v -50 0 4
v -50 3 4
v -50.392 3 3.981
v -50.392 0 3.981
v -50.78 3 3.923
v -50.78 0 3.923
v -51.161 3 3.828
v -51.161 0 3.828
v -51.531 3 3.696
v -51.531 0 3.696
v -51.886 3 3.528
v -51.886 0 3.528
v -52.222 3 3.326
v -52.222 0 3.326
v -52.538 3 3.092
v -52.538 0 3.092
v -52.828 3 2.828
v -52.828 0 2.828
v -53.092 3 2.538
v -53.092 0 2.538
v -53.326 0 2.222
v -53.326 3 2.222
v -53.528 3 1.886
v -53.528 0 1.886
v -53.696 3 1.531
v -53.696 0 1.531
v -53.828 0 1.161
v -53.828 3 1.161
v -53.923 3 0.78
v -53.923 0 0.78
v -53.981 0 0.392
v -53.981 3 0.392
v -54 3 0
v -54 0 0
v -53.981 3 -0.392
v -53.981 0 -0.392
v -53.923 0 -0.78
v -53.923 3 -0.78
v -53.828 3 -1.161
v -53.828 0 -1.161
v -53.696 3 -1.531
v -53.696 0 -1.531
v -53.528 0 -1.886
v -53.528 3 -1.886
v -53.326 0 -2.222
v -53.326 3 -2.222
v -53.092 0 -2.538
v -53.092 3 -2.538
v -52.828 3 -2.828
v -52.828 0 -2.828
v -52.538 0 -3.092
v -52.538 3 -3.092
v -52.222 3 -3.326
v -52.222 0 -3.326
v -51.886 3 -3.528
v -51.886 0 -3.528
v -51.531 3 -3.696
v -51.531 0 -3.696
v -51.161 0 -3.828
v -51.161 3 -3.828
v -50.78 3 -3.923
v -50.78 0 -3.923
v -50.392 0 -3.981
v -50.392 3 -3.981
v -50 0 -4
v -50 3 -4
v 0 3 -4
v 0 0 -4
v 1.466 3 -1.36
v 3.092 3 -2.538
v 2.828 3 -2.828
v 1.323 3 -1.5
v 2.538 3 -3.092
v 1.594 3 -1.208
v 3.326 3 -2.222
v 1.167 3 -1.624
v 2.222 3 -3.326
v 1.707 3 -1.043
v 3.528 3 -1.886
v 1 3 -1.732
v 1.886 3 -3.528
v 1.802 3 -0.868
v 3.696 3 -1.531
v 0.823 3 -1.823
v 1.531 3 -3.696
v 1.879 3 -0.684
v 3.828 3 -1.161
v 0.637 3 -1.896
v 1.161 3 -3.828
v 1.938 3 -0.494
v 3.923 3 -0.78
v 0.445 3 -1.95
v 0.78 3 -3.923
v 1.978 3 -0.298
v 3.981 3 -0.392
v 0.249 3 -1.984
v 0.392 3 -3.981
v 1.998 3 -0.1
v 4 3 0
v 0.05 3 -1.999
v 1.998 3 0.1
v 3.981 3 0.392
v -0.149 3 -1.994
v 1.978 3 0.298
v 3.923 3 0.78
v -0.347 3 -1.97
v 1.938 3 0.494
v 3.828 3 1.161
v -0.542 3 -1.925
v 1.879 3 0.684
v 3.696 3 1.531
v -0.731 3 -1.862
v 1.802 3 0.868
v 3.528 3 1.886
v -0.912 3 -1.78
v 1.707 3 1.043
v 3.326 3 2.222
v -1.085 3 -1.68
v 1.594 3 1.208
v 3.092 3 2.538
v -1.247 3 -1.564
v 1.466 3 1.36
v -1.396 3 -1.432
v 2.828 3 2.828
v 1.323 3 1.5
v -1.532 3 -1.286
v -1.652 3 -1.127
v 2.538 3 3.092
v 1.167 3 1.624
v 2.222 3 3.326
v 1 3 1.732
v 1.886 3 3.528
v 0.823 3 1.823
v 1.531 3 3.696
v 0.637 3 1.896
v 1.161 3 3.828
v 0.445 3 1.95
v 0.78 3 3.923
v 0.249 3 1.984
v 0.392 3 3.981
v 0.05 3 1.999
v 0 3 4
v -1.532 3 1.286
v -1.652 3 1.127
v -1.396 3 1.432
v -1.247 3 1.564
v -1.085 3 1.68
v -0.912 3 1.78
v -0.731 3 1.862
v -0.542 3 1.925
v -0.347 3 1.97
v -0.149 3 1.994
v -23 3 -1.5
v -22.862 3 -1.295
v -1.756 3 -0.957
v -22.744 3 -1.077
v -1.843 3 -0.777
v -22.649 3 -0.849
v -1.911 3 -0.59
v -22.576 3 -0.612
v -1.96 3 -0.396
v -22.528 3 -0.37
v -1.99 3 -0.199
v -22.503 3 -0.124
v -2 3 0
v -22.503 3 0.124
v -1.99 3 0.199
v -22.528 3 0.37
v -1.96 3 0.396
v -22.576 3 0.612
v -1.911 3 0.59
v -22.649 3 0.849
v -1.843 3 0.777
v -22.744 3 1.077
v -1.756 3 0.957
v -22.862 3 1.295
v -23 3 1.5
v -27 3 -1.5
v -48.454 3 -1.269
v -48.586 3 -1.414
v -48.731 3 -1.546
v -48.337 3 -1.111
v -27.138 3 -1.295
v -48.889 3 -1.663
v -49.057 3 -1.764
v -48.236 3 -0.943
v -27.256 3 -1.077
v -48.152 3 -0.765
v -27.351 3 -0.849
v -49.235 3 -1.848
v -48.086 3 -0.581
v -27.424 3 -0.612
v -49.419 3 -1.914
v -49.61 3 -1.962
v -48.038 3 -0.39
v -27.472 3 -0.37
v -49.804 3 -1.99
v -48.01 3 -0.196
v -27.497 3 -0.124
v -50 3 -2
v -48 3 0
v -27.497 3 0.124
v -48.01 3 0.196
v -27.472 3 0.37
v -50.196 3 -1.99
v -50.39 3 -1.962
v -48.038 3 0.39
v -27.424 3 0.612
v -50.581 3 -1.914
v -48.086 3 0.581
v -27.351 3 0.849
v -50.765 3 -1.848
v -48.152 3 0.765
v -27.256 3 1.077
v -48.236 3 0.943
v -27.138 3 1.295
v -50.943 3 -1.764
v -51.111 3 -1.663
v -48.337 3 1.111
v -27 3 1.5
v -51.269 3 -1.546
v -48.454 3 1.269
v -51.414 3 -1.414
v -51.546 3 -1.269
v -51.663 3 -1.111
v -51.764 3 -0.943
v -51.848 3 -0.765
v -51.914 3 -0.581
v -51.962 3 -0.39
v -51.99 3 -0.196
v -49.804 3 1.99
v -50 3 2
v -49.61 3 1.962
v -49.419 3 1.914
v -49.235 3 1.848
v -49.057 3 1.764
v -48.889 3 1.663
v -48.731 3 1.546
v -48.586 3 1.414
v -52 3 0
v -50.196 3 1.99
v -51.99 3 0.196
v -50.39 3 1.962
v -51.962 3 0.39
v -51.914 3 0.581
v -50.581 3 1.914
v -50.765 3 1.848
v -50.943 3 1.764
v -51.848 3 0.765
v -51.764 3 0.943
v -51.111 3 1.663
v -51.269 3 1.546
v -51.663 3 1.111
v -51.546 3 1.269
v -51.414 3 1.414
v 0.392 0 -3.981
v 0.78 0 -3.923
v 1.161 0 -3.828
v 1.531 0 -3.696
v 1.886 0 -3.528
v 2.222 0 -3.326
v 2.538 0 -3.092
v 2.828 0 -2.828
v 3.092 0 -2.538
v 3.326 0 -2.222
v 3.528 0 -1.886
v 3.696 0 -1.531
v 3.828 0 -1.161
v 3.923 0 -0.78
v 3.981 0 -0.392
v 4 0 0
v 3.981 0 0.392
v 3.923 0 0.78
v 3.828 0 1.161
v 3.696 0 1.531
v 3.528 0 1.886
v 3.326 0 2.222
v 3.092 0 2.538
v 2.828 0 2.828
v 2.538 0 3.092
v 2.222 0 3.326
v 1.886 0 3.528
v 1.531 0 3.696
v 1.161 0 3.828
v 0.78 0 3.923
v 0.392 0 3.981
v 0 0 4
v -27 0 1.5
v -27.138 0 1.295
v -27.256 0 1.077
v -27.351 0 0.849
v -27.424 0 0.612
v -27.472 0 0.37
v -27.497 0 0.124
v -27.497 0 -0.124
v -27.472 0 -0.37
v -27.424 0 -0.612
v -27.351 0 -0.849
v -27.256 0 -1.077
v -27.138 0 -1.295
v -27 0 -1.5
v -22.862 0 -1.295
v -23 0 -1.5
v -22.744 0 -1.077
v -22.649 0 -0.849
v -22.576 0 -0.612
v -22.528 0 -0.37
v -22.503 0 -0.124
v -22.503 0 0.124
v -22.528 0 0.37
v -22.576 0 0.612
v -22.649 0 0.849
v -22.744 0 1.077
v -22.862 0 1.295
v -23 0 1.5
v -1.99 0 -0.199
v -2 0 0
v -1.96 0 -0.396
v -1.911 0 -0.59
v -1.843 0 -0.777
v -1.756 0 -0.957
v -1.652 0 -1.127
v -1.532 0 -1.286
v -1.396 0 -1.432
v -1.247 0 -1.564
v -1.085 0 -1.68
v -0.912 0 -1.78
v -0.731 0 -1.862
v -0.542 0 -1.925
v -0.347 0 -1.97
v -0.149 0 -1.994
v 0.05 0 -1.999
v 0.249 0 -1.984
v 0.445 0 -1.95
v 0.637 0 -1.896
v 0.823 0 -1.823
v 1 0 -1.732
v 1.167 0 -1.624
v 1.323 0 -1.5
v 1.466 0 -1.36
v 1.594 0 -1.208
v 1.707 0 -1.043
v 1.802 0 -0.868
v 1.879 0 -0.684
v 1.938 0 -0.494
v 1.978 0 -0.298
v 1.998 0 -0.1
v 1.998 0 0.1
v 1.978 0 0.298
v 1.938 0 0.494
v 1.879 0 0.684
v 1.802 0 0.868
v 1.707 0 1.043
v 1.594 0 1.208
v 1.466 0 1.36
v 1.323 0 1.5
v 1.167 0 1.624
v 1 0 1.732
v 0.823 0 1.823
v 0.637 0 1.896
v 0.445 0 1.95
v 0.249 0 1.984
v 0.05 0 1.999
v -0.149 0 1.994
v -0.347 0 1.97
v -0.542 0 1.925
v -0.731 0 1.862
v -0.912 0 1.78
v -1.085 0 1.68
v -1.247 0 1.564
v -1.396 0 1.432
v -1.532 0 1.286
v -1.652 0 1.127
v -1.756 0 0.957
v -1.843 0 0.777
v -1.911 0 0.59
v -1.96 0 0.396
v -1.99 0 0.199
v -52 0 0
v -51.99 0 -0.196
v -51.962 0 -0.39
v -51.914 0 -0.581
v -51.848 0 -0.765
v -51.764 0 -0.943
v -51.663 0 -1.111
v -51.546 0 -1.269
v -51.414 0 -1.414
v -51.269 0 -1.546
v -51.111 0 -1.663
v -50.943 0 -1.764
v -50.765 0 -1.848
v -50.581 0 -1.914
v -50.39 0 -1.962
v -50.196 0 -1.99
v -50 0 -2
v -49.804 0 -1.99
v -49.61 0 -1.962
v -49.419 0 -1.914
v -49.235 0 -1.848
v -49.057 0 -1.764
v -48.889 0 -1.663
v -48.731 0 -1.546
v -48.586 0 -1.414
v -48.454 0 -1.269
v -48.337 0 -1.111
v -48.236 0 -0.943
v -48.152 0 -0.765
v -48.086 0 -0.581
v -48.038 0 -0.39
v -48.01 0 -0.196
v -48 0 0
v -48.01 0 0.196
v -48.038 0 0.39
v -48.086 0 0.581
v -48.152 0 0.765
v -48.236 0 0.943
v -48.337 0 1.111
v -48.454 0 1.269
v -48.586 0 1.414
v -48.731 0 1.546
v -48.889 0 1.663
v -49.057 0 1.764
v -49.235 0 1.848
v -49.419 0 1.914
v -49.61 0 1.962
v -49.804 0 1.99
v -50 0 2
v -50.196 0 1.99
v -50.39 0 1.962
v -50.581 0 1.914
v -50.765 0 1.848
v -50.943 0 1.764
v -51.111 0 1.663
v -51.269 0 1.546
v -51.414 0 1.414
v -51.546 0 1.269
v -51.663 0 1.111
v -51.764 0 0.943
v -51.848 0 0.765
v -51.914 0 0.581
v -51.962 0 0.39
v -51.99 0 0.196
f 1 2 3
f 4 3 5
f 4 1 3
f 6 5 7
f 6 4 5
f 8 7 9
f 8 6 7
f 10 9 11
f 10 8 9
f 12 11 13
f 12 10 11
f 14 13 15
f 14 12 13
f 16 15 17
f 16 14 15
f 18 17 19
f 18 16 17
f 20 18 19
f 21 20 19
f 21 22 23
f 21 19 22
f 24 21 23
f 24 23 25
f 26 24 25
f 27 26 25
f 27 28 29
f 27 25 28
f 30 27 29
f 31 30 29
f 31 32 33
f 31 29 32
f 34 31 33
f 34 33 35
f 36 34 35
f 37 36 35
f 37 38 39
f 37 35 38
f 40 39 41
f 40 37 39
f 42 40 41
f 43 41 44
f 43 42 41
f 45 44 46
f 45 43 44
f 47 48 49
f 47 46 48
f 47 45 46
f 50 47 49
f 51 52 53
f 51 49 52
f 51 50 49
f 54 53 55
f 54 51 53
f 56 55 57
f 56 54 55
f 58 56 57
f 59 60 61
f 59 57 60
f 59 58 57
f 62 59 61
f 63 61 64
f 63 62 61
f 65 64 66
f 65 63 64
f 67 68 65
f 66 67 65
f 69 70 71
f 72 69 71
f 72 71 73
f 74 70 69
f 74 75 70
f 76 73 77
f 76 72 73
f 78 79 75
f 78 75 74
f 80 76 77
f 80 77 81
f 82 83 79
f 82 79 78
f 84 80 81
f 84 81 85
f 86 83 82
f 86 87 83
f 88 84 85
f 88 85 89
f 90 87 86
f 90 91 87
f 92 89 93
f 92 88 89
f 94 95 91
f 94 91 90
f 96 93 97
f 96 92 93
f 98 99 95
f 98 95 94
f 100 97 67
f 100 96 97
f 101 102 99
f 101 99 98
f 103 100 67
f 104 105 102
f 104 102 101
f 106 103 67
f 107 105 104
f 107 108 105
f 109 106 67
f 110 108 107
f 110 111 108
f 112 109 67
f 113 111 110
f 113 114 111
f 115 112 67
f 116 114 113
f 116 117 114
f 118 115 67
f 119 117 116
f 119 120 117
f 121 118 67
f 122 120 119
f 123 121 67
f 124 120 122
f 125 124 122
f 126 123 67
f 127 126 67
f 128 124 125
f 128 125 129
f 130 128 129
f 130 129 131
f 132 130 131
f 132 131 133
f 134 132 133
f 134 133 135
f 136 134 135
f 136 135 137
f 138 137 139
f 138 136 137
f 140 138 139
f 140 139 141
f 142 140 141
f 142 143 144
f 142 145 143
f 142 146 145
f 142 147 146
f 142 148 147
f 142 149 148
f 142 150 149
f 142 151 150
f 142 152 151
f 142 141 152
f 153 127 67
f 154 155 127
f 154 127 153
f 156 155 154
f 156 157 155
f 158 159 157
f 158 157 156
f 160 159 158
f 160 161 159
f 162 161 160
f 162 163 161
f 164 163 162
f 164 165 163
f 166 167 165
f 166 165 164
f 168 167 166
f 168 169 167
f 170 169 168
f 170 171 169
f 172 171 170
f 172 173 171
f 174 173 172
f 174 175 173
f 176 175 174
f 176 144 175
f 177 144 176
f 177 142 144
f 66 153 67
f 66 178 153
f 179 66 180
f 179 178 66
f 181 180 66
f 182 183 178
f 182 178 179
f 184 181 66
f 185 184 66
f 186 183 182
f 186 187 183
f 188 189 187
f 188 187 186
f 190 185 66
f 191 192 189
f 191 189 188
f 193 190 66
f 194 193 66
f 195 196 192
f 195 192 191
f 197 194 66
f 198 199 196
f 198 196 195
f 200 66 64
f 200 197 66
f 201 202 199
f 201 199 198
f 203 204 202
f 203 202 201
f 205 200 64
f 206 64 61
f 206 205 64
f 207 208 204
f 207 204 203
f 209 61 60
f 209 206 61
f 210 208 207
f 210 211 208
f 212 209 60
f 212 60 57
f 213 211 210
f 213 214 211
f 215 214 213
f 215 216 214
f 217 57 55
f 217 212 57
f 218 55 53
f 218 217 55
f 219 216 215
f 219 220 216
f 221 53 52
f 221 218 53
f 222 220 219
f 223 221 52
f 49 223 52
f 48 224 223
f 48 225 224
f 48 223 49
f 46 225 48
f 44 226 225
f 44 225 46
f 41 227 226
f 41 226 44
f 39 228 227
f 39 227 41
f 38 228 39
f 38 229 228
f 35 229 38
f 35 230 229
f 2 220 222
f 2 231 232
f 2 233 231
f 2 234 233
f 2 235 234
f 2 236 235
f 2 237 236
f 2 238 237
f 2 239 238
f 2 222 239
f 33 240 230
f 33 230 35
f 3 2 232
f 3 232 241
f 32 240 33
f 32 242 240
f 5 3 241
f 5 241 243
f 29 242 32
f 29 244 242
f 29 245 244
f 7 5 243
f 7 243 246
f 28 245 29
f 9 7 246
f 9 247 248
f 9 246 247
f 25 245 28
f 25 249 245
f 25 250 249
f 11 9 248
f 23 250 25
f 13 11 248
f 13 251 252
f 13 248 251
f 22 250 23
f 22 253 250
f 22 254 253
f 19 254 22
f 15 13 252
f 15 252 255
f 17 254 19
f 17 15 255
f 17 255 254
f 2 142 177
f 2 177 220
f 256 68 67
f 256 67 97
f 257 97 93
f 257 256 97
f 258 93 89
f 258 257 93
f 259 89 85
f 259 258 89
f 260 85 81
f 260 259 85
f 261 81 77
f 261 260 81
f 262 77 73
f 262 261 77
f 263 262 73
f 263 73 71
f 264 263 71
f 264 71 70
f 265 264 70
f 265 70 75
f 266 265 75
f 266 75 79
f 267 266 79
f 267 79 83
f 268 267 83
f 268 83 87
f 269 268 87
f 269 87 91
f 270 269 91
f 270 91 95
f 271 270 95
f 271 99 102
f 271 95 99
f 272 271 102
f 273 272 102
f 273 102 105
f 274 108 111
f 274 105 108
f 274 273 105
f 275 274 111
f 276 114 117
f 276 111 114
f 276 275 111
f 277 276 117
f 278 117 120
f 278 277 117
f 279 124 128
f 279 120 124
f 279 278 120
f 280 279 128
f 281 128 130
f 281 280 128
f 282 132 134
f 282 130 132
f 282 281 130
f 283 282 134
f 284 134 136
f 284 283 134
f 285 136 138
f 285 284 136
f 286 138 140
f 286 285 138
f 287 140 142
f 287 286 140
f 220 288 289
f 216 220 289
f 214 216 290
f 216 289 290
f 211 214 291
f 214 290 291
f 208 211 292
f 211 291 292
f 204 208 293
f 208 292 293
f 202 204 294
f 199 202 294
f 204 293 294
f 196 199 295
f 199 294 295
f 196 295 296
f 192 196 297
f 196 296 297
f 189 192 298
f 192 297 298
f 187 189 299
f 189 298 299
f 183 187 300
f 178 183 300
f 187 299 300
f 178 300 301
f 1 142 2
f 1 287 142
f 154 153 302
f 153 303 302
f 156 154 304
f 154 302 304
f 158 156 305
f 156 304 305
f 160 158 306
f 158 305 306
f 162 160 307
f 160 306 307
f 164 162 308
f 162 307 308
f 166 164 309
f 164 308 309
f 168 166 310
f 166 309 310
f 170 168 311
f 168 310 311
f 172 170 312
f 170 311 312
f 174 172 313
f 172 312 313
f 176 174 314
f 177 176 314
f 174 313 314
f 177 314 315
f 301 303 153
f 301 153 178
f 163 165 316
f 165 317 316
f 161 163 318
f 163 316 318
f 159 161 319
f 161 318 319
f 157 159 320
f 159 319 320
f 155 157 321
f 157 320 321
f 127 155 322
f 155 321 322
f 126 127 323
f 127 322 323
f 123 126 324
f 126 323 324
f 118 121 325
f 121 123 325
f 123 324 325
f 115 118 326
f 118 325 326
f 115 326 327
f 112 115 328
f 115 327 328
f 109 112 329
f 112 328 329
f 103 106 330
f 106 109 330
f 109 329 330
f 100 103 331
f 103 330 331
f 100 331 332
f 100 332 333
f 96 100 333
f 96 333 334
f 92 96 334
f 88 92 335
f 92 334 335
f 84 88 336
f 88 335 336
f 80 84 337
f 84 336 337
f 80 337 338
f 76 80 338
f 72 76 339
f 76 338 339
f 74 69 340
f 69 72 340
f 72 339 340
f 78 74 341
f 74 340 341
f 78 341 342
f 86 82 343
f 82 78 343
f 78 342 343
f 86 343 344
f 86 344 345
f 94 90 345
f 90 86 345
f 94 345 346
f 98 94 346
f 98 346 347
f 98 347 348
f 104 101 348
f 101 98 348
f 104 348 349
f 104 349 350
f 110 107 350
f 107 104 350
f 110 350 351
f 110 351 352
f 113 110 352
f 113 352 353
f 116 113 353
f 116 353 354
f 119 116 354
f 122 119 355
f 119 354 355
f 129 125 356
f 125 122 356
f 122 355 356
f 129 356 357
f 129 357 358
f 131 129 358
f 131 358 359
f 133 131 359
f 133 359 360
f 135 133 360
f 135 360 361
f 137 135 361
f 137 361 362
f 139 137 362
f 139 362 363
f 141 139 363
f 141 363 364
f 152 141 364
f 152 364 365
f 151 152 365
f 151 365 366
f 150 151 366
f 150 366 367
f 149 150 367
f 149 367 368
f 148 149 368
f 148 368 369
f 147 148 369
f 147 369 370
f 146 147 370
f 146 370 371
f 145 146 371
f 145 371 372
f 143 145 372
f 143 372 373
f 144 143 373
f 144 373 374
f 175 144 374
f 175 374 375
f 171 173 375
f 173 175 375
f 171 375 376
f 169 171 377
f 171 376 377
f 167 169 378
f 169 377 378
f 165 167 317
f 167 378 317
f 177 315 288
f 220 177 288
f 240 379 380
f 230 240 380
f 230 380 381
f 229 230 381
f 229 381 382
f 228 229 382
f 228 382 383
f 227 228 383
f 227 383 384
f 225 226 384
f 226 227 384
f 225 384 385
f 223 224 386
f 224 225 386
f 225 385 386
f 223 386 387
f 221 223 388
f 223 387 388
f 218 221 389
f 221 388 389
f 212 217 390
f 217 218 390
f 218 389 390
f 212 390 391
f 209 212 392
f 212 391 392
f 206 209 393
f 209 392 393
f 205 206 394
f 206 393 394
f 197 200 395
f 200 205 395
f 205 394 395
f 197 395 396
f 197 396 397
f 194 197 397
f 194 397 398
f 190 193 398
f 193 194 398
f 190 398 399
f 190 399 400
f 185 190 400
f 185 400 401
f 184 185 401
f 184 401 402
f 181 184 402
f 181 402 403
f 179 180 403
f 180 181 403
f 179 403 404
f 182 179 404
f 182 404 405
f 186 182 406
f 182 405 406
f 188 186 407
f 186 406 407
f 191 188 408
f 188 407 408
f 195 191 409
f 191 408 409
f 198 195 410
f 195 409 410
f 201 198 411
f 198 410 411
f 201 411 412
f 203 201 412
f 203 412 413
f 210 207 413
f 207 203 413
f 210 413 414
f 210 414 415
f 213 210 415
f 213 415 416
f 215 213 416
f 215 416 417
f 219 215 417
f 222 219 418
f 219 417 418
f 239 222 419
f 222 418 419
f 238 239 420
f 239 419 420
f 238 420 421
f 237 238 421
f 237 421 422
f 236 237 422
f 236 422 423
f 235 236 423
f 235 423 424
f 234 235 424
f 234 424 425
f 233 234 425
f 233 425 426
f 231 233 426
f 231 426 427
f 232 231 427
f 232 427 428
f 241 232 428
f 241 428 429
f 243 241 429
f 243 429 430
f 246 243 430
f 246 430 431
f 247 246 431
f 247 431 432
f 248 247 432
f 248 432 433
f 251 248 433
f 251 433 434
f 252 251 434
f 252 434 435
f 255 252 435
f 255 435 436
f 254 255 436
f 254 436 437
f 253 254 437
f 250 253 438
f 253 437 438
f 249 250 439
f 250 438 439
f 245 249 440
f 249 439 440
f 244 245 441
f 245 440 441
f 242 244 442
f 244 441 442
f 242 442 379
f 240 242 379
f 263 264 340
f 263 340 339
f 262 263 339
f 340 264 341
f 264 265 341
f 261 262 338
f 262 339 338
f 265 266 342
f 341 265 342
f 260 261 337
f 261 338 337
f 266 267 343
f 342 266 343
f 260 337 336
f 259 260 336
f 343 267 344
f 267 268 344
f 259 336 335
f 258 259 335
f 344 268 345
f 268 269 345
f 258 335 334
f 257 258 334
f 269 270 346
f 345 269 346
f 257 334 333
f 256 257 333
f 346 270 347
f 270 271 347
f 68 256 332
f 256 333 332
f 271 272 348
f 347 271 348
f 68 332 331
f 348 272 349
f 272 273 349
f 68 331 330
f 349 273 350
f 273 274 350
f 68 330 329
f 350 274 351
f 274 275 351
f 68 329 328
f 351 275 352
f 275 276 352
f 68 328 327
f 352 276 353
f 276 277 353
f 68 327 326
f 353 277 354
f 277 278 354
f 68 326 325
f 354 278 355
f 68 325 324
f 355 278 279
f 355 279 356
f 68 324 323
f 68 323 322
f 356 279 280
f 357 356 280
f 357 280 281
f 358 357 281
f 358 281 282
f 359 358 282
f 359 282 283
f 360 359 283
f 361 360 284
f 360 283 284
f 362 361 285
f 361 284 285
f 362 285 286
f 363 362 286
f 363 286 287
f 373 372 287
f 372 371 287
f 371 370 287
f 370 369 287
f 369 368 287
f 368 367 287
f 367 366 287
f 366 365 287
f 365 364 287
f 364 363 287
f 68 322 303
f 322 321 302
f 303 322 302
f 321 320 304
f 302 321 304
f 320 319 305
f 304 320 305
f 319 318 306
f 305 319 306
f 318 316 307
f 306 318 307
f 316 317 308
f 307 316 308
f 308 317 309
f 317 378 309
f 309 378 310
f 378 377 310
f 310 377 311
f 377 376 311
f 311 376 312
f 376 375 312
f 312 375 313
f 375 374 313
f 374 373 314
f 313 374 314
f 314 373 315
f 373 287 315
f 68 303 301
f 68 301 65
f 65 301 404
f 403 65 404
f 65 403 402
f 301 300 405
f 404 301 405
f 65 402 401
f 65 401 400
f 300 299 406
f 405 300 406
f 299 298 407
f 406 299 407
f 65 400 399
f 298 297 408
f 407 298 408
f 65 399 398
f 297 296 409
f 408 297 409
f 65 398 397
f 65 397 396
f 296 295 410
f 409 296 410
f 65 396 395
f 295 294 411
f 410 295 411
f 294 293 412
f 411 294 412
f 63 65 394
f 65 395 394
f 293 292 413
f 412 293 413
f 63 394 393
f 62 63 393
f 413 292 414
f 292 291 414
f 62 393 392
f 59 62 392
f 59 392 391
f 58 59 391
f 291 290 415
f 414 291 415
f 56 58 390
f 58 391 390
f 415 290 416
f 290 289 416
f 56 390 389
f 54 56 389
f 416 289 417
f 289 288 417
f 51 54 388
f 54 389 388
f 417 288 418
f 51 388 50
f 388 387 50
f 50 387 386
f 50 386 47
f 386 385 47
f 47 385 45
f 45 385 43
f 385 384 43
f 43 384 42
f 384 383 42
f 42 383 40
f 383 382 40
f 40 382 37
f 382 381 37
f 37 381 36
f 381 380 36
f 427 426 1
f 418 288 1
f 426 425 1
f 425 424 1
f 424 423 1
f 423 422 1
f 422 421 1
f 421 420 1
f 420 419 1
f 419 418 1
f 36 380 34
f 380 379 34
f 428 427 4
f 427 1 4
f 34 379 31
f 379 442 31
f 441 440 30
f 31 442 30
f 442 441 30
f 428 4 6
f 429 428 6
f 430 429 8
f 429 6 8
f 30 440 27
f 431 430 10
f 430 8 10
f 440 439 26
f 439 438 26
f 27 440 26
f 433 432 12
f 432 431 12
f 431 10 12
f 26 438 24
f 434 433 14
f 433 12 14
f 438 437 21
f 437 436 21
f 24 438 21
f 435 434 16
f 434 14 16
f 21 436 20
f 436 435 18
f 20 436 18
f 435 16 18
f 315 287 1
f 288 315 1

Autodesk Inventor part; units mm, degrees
ref_plane "YZ Plane" through (0, 0, 0) normal (1, 0, 0) x (0, 1, 0)
ref_plane "XZ Plane" through (0, 0, 0) normal (0, 1, 0) x (-1, 0, 0)
ref_plane "XY Plane" through (0, 0, 0) normal (0, 0, 1) x (1, 0, 0)
sketch "Sketch1" plane through (0, 0, 0) normal (0, 1, 0) x (-1, 0, 0)
  line L0 (0, 0) -> (25, 0)
  line L1 (25, 0) -> (50, 0)
  circle A0 centre (50, 0) radius 2
  circle A1 centre (50, 0) radius 4
  circle A2 centre (0, 0) radius 4
  line L2 (0, 4) -> (50, 4)
  line L3 (0, -4) -> (50, -4)
  circle A3 centre (25, 0) radius 2.5
  line L4 (25, 0) -> (25, 1.5)
  line L5 (25, 1.5) -> (28.63, 1.5)
  line L6 (28.63, 1.5) -> (20.4744, 1.5)
  line L7 (20.4744, 1.5) -> (20.4744, -1.5)
  line L8 (20.4744, -1.5) -> (28.63, -1.5)
  line L9 (28.63, -1.5) -> (28.63, 1.5)
  circle A4 centre (0, 0) radius 2
  point P0 (27, 1.5)
  point P1 (27, -1.5)
  point P2 (23, -1.5)
  point P3 (23, 1.5)
  dimension "d1" = 25
  dimension "d2" = 25
  dimension "d3" = 4
  dimension "d4" = 8
  dimension "d5" = 8
  dimension "d6" = 5
  dimension "d7" = 1.5
  dimension "d8" = 3
  dimension "d9" = 4
extrude "Extrusion1" add sketch "Sketch1" along normal blind 3 contours A2 | A2 L2 A1 L1 L9 L5 A3 L6 L7 L0 | L0 L7 L8 A3 L9 L1 A1 L3 A2 | L7 L6 A3 L0 | L0 A3 L8 L7 | A1 | A3 L5 L6 | L8 A3 | A3 L5 L9 L1 | L1 L9 L8 A3
properties part number "stuurarm motor"
